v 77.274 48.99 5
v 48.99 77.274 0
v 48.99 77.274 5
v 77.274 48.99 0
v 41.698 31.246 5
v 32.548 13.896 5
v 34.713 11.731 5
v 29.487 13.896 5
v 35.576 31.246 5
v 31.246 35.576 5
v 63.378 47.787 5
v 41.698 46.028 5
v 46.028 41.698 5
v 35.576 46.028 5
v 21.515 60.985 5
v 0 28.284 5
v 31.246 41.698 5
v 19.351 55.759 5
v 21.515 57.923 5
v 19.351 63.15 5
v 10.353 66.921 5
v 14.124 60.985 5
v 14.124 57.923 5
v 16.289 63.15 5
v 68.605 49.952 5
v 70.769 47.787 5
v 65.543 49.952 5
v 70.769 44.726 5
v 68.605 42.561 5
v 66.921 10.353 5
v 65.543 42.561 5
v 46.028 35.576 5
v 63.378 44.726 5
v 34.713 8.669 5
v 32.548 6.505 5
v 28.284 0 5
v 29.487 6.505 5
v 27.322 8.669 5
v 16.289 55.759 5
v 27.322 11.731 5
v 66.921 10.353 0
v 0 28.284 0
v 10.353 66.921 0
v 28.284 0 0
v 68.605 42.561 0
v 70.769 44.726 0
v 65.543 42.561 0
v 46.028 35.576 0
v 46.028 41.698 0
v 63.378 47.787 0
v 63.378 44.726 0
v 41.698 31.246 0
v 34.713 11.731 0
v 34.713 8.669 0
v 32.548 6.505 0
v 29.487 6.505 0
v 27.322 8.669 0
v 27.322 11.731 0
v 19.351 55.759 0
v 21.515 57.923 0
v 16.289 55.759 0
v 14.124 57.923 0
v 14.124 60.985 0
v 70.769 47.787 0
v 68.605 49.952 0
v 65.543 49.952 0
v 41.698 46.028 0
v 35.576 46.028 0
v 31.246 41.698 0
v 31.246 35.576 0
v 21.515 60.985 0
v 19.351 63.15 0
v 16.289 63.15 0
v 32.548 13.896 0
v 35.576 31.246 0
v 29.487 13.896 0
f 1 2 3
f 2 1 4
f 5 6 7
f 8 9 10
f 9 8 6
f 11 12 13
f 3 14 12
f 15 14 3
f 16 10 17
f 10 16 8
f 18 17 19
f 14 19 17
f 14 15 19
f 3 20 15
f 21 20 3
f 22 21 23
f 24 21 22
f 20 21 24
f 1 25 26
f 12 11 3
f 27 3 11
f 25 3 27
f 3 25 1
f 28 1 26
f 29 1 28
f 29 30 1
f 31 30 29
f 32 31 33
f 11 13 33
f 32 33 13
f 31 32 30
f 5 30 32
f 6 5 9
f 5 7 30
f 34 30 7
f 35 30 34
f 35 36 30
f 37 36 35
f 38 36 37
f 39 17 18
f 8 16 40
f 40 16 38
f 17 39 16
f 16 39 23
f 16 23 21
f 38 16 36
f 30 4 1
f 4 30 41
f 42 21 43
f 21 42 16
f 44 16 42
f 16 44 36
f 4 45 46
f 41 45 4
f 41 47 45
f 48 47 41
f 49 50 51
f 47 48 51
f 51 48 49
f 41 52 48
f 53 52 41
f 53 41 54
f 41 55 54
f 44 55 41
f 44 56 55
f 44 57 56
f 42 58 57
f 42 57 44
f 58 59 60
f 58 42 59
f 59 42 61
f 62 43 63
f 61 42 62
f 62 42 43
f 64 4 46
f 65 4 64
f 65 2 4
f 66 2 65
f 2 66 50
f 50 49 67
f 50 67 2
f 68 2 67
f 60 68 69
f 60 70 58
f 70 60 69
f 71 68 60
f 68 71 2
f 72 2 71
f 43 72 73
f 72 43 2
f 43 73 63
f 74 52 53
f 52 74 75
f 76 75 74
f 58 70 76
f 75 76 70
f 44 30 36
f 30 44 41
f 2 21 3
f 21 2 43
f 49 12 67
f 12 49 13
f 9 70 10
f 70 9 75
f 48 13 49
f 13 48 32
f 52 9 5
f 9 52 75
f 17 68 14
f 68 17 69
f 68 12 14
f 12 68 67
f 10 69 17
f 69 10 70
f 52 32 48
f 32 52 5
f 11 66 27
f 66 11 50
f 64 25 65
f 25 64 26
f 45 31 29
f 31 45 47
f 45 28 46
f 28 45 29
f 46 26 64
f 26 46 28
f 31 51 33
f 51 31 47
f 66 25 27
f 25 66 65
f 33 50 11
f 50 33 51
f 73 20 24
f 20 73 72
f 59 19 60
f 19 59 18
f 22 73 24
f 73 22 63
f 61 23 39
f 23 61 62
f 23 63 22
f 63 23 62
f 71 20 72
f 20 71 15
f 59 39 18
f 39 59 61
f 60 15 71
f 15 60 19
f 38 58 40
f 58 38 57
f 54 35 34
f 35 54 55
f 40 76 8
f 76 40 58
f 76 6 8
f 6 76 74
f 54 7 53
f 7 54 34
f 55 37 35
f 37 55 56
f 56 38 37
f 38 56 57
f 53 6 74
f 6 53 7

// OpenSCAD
$fn = 32;

// ----------------------------------------------------------------------
// Polygon plate: 6-gon R40, 3 bolt windows
// ----------------------------------------------------------------------

// --- parameters (mm) ---
sides = 6;                // number of polygon sides
plate_r = 40;             // circumscribed radius of the polygon
bore_r = 8;               // centre bore radius
bolts = 3;                // number of bolt windows
ring_r = 29.44;           // bolt-circle radius
bolt_r = 4;               // bolt window radius
plate_t = 5;              // plate thickness, Z (extrusion height)
fit_tol = 0.1;            // declared fit tolerance (prompt contract)
free_tol = 0.3;           // declared free tolerance (prompt contract)

plate_d = 2 * plate_r;  // circumscribed diameter
bore_d = 2 * bore_r;  // centre bore diameter
bolt_d = 2 * bolt_r;  // bolt window diameter
ring_d = 2 * ring_r;  // bolt-circle diameter

profile = [[77.274, 48.99], [48.99, 77.274], [10.353, 66.921], [0, 28.284], [28.284, 0], [66.921, 10.353]];  // primary outline, 6 points, counter clockwise
void_1 = [[46.028, 41.698], [41.698, 46.028], [35.576, 46.028], [31.246, 41.698], [31.246, 35.576], [35.576, 31.246], [41.698, 31.246], [46.028, 35.576]];  // centre bore, 8 points
void_2 = [[70.769, 47.787], [68.605, 49.952], [65.543, 49.952], [63.378, 47.787], [63.378, 44.726], [65.543, 42.561], [68.605, 42.561], [70.769, 44.726]];  // bolt window 1, 8 points
void_3 = [[21.515, 60.985], [19.351, 63.15], [16.289, 63.15], [14.124, 60.985], [14.124, 57.923], [16.289, 55.759], [19.351, 55.759], [21.515, 57.923]];  // bolt window 2, 8 points
void_4 = [[34.713, 11.731], [32.548, 13.896], [29.487, 13.896], [27.322, 11.731], [27.322, 8.669], [29.487, 6.505], [32.548, 6.505], [34.713, 8.669]];  // bolt window 3, 8 points

// --- the one profile operation ---
difference() {
  linear_extrude(height = plate_t) polygon(points = profile);
  translate([0, 0, -1])
    linear_extrude(height = plate_t + 2) polygon(points = void_1);
  translate([0, 0, -1])
    linear_extrude(height = plate_t + 2) polygon(points = void_2);
  translate([0, 0, -1])
    linear_extrude(height = plate_t + 2) polygon(points = void_3);
  translate([0, 0, -1])
    linear_extrude(height = plate_t + 2) polygon(points = void_4);
}
